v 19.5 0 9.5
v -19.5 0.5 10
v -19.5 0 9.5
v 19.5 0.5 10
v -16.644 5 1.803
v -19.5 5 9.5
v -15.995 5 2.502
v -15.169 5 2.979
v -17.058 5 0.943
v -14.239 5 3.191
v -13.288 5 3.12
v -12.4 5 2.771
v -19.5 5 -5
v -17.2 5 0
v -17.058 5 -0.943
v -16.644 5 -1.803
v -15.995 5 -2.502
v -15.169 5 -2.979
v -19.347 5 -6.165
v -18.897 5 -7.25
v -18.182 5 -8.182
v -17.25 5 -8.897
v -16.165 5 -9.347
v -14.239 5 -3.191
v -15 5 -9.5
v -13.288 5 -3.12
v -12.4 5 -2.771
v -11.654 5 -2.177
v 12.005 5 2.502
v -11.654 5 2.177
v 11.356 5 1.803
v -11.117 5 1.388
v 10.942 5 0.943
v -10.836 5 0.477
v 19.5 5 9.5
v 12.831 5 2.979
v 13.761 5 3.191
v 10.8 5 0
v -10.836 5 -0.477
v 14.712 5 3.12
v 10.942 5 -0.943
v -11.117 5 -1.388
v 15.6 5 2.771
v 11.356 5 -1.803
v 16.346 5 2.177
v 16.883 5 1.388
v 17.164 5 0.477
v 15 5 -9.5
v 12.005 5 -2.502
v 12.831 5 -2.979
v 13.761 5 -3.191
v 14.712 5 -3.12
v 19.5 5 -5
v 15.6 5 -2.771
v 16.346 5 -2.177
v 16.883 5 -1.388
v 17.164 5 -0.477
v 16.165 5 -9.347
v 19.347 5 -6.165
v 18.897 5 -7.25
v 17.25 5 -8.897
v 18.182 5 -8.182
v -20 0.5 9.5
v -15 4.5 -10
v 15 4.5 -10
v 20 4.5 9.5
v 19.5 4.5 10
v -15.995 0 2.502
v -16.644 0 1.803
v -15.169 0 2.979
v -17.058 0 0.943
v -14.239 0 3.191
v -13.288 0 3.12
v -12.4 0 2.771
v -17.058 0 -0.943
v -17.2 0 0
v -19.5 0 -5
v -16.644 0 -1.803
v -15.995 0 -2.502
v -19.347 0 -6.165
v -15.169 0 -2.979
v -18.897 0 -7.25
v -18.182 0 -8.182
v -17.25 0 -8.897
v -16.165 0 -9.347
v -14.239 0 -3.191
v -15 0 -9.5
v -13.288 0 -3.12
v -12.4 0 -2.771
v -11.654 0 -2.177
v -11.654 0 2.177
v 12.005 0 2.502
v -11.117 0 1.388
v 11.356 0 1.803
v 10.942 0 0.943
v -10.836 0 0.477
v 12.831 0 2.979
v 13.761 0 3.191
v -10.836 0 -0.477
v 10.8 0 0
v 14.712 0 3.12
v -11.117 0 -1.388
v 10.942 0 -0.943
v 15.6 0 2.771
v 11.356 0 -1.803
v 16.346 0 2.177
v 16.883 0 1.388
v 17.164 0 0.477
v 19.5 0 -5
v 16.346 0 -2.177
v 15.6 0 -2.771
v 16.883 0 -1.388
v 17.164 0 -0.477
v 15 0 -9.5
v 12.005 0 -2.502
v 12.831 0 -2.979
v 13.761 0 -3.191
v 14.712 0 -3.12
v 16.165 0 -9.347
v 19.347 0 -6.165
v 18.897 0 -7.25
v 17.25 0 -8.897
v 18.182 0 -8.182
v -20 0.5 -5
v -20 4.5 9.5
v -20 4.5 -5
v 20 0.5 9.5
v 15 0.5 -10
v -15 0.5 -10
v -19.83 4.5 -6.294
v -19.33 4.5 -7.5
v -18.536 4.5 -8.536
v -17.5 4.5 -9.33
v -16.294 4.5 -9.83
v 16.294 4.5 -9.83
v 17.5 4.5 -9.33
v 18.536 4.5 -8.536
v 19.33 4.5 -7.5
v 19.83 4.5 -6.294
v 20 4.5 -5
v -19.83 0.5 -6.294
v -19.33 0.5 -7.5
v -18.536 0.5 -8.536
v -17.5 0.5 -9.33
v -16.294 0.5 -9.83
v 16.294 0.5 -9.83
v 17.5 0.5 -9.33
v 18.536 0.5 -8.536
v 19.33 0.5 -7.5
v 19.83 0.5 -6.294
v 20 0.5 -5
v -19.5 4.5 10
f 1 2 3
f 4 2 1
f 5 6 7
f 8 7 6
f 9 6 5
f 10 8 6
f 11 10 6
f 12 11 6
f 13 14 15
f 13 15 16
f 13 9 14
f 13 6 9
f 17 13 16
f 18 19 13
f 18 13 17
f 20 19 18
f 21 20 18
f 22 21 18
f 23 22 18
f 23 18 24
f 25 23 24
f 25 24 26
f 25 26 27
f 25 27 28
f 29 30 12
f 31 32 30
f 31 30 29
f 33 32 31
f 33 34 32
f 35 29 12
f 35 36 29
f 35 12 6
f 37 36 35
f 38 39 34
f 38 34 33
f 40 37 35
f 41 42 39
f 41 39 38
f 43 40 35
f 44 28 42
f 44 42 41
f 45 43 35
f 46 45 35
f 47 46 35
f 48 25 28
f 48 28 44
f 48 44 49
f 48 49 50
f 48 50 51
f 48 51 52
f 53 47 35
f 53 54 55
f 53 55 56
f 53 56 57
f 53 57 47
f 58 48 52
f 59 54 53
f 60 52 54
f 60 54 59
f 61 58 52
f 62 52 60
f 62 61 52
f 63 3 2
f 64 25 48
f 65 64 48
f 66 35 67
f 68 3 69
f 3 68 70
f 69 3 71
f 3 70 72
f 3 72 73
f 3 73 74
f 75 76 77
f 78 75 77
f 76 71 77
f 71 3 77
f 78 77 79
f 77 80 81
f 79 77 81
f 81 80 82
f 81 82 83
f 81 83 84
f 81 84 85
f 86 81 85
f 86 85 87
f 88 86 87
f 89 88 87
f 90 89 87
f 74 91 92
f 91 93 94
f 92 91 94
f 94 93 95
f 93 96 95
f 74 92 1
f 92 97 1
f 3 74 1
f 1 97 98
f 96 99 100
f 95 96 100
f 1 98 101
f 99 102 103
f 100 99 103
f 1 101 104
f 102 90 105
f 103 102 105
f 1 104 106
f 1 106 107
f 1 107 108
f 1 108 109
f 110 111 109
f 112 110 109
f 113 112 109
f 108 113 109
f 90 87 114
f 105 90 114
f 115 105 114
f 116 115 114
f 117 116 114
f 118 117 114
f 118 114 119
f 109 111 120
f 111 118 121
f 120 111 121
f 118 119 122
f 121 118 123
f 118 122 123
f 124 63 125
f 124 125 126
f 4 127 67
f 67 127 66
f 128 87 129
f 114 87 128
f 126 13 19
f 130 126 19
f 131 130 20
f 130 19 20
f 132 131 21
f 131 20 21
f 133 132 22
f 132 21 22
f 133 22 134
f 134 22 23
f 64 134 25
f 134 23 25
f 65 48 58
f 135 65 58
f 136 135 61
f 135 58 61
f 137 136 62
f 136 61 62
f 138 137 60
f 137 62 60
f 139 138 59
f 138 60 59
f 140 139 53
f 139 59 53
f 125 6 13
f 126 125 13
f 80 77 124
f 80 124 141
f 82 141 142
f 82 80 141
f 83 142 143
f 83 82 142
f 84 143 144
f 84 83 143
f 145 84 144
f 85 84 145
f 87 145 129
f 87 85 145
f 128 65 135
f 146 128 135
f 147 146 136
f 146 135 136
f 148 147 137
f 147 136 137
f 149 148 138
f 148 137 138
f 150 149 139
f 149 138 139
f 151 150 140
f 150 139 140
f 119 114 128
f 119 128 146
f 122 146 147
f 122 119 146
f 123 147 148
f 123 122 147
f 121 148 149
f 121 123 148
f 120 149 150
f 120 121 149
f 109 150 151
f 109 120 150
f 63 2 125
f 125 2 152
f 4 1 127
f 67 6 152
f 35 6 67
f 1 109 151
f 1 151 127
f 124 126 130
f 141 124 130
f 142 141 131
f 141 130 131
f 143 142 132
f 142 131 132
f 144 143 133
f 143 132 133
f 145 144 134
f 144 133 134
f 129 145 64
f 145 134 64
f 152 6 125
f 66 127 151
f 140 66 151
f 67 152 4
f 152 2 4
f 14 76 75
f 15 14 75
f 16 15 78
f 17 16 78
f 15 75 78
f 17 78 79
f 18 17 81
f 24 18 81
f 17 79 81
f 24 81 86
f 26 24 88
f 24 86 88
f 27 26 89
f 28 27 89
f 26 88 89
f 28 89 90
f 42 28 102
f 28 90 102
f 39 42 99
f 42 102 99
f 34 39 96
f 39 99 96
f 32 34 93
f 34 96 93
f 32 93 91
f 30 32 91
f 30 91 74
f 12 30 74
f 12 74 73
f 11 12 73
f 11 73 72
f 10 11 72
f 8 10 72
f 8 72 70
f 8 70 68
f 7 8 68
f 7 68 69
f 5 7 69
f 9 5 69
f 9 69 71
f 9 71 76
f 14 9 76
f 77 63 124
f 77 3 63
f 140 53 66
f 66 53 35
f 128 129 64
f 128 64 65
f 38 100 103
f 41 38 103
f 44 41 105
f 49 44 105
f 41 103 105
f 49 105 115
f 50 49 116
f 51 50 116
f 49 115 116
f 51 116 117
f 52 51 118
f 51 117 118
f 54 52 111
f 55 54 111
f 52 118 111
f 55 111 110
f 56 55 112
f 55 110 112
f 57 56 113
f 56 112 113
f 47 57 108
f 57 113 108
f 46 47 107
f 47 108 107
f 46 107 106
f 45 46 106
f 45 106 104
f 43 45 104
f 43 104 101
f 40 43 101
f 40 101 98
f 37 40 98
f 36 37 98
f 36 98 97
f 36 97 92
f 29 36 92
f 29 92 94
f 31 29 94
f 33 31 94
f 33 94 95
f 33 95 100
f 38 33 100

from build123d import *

# Parameters (mm, degrees)
SKETCH1_W            = 40
SKETCH1_H            = 20
BOSS_EXTRUDE1_DEPTH  = 5
M6_CLEARANCE_HOLE1_D = 6.4
FILLET1_R            = 5
CHAMFER1_SIZE        = 0.5


with BuildPart() as part:
    # Sketch1 → Boss-Extrude1 (new body)
    with BuildSketch(Plane(origin=(0, 0, 0), x_dir=(1, 0, 0), z_dir=(0, 1, 0))):
        Rectangle(SKETCH1_W, SKETCH1_H)
    extrude(amount=BOSS_EXTRUDE1_DEPTH)

    # M6 Clearance Hole1 (through all)
    with Locations(Plane(origin=(0, 5, 0), x_dir=(1, 0, 0), z_dir=(0, 1, 0))):
        with Locations((-14, 0), (14, 0)):
            Hole(M6_CLEARANCE_HOLE1_D / 2)

    # Fillet1
    fillet1_edges = [part.edges().sort_by_distance(p)[0] for p in [
        (-20, 2.5, -10),
        (20, 2.5, -10),
    ]]
    fillet(fillet1_edges, radius=FILLET1_R)

    # Chamfer1
    chamfer1_edges = [part.edges().sort_by_distance(p)[0] for p in [
        (0, 5, 10),
        (-20, 0, 2.5),
        (-20, 5, 2.5),
        (0, 0, -10),
        (18.535533906, 0, -8.535533906),
        (-18.535533906, 0, -8.535533906),
        (0, 5, -10),
        (18.535533906, 5, -8.535533906),
        (-18.535533906, 5, -8.535533906),
        (20, 5, 2.5),
        (0, 0, 10),
        (20, 0, 2.5),
        (20, 2.5, 10),
        (-20, 2.5, 10),
    ]]
    chamfer(chamfer1_edges, length=CHAMFER1_SIZE)


solid = part.part
